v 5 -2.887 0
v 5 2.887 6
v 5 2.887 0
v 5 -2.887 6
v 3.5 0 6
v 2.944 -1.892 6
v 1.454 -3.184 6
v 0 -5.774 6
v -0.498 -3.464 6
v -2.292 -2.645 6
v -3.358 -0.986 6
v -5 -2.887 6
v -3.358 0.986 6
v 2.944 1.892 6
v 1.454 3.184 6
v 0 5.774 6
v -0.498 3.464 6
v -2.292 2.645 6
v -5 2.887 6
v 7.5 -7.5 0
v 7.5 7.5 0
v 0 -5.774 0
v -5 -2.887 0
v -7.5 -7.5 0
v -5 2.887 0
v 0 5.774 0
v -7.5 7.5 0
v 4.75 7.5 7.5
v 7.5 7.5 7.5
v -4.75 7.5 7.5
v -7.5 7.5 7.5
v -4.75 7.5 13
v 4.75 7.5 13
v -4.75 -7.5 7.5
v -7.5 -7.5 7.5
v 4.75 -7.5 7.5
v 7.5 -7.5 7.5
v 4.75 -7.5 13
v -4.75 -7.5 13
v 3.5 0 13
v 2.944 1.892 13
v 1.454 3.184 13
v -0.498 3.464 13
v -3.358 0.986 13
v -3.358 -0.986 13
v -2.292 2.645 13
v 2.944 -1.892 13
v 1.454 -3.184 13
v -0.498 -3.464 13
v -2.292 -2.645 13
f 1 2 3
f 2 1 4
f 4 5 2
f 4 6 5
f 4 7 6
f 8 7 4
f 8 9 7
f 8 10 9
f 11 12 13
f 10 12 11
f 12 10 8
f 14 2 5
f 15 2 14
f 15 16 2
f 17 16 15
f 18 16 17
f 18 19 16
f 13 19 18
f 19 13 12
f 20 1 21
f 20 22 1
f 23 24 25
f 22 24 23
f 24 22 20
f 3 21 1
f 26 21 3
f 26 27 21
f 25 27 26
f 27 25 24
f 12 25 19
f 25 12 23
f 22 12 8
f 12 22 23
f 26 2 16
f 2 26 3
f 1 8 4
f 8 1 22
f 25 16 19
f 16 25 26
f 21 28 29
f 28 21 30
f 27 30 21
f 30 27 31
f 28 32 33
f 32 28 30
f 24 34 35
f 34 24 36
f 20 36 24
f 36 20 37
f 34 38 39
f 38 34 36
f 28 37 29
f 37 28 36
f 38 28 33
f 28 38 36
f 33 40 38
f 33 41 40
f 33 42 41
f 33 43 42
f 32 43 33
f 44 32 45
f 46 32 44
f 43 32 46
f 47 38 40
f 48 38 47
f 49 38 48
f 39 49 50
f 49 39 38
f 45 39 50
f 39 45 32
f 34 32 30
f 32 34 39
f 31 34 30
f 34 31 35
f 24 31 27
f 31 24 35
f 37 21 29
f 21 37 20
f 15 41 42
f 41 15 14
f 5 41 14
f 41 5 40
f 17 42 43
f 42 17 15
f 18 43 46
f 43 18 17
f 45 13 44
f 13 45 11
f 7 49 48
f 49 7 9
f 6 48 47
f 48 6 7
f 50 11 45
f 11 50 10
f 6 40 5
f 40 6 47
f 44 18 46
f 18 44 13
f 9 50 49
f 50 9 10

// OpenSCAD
// hole diameter
holeDiameter=7;

// dimensions of T-slot in table
A=9.5; 
H1=5.5;
H2=7.5;
C=15;

// length of T-nut
nutLength=15;

// dimensions of flat side of included Mx nut
nutWidth=10;

// dimensions (height) of included Mx nut
nutHeight=6;

module tnut() {
  P=(C-A)/2;
  difference() {
    translate([-C/2,nutLength/2,0])
    rotate([90,0,0])
    linear_extrude (height=nutLength)
    polygon(points=[[0,0], [C,0], [C,H2], [C-P,H2], [C-P,H2+H1], [P,H2+H1], [P,H2], [0,H2]]);
    
    cylinder (h=H1+H2,d=holeDiameter);

    angle = 360/6;
	  cote = nutWidth * (1 / tan (angle));

    translate([0,0,nutHeight/2])
    union() {
      rotate([0,0,0]) cube([nutWidth,cote,nutHeight],center=true);
      rotate([0,0,angle]) cube([nutWidth,cote,nutHeight],center=true);
      rotate([0,0,2*angle]) cube([nutWidth,cote,nutHeight],center=true);
    }
  }
}

tnut();
